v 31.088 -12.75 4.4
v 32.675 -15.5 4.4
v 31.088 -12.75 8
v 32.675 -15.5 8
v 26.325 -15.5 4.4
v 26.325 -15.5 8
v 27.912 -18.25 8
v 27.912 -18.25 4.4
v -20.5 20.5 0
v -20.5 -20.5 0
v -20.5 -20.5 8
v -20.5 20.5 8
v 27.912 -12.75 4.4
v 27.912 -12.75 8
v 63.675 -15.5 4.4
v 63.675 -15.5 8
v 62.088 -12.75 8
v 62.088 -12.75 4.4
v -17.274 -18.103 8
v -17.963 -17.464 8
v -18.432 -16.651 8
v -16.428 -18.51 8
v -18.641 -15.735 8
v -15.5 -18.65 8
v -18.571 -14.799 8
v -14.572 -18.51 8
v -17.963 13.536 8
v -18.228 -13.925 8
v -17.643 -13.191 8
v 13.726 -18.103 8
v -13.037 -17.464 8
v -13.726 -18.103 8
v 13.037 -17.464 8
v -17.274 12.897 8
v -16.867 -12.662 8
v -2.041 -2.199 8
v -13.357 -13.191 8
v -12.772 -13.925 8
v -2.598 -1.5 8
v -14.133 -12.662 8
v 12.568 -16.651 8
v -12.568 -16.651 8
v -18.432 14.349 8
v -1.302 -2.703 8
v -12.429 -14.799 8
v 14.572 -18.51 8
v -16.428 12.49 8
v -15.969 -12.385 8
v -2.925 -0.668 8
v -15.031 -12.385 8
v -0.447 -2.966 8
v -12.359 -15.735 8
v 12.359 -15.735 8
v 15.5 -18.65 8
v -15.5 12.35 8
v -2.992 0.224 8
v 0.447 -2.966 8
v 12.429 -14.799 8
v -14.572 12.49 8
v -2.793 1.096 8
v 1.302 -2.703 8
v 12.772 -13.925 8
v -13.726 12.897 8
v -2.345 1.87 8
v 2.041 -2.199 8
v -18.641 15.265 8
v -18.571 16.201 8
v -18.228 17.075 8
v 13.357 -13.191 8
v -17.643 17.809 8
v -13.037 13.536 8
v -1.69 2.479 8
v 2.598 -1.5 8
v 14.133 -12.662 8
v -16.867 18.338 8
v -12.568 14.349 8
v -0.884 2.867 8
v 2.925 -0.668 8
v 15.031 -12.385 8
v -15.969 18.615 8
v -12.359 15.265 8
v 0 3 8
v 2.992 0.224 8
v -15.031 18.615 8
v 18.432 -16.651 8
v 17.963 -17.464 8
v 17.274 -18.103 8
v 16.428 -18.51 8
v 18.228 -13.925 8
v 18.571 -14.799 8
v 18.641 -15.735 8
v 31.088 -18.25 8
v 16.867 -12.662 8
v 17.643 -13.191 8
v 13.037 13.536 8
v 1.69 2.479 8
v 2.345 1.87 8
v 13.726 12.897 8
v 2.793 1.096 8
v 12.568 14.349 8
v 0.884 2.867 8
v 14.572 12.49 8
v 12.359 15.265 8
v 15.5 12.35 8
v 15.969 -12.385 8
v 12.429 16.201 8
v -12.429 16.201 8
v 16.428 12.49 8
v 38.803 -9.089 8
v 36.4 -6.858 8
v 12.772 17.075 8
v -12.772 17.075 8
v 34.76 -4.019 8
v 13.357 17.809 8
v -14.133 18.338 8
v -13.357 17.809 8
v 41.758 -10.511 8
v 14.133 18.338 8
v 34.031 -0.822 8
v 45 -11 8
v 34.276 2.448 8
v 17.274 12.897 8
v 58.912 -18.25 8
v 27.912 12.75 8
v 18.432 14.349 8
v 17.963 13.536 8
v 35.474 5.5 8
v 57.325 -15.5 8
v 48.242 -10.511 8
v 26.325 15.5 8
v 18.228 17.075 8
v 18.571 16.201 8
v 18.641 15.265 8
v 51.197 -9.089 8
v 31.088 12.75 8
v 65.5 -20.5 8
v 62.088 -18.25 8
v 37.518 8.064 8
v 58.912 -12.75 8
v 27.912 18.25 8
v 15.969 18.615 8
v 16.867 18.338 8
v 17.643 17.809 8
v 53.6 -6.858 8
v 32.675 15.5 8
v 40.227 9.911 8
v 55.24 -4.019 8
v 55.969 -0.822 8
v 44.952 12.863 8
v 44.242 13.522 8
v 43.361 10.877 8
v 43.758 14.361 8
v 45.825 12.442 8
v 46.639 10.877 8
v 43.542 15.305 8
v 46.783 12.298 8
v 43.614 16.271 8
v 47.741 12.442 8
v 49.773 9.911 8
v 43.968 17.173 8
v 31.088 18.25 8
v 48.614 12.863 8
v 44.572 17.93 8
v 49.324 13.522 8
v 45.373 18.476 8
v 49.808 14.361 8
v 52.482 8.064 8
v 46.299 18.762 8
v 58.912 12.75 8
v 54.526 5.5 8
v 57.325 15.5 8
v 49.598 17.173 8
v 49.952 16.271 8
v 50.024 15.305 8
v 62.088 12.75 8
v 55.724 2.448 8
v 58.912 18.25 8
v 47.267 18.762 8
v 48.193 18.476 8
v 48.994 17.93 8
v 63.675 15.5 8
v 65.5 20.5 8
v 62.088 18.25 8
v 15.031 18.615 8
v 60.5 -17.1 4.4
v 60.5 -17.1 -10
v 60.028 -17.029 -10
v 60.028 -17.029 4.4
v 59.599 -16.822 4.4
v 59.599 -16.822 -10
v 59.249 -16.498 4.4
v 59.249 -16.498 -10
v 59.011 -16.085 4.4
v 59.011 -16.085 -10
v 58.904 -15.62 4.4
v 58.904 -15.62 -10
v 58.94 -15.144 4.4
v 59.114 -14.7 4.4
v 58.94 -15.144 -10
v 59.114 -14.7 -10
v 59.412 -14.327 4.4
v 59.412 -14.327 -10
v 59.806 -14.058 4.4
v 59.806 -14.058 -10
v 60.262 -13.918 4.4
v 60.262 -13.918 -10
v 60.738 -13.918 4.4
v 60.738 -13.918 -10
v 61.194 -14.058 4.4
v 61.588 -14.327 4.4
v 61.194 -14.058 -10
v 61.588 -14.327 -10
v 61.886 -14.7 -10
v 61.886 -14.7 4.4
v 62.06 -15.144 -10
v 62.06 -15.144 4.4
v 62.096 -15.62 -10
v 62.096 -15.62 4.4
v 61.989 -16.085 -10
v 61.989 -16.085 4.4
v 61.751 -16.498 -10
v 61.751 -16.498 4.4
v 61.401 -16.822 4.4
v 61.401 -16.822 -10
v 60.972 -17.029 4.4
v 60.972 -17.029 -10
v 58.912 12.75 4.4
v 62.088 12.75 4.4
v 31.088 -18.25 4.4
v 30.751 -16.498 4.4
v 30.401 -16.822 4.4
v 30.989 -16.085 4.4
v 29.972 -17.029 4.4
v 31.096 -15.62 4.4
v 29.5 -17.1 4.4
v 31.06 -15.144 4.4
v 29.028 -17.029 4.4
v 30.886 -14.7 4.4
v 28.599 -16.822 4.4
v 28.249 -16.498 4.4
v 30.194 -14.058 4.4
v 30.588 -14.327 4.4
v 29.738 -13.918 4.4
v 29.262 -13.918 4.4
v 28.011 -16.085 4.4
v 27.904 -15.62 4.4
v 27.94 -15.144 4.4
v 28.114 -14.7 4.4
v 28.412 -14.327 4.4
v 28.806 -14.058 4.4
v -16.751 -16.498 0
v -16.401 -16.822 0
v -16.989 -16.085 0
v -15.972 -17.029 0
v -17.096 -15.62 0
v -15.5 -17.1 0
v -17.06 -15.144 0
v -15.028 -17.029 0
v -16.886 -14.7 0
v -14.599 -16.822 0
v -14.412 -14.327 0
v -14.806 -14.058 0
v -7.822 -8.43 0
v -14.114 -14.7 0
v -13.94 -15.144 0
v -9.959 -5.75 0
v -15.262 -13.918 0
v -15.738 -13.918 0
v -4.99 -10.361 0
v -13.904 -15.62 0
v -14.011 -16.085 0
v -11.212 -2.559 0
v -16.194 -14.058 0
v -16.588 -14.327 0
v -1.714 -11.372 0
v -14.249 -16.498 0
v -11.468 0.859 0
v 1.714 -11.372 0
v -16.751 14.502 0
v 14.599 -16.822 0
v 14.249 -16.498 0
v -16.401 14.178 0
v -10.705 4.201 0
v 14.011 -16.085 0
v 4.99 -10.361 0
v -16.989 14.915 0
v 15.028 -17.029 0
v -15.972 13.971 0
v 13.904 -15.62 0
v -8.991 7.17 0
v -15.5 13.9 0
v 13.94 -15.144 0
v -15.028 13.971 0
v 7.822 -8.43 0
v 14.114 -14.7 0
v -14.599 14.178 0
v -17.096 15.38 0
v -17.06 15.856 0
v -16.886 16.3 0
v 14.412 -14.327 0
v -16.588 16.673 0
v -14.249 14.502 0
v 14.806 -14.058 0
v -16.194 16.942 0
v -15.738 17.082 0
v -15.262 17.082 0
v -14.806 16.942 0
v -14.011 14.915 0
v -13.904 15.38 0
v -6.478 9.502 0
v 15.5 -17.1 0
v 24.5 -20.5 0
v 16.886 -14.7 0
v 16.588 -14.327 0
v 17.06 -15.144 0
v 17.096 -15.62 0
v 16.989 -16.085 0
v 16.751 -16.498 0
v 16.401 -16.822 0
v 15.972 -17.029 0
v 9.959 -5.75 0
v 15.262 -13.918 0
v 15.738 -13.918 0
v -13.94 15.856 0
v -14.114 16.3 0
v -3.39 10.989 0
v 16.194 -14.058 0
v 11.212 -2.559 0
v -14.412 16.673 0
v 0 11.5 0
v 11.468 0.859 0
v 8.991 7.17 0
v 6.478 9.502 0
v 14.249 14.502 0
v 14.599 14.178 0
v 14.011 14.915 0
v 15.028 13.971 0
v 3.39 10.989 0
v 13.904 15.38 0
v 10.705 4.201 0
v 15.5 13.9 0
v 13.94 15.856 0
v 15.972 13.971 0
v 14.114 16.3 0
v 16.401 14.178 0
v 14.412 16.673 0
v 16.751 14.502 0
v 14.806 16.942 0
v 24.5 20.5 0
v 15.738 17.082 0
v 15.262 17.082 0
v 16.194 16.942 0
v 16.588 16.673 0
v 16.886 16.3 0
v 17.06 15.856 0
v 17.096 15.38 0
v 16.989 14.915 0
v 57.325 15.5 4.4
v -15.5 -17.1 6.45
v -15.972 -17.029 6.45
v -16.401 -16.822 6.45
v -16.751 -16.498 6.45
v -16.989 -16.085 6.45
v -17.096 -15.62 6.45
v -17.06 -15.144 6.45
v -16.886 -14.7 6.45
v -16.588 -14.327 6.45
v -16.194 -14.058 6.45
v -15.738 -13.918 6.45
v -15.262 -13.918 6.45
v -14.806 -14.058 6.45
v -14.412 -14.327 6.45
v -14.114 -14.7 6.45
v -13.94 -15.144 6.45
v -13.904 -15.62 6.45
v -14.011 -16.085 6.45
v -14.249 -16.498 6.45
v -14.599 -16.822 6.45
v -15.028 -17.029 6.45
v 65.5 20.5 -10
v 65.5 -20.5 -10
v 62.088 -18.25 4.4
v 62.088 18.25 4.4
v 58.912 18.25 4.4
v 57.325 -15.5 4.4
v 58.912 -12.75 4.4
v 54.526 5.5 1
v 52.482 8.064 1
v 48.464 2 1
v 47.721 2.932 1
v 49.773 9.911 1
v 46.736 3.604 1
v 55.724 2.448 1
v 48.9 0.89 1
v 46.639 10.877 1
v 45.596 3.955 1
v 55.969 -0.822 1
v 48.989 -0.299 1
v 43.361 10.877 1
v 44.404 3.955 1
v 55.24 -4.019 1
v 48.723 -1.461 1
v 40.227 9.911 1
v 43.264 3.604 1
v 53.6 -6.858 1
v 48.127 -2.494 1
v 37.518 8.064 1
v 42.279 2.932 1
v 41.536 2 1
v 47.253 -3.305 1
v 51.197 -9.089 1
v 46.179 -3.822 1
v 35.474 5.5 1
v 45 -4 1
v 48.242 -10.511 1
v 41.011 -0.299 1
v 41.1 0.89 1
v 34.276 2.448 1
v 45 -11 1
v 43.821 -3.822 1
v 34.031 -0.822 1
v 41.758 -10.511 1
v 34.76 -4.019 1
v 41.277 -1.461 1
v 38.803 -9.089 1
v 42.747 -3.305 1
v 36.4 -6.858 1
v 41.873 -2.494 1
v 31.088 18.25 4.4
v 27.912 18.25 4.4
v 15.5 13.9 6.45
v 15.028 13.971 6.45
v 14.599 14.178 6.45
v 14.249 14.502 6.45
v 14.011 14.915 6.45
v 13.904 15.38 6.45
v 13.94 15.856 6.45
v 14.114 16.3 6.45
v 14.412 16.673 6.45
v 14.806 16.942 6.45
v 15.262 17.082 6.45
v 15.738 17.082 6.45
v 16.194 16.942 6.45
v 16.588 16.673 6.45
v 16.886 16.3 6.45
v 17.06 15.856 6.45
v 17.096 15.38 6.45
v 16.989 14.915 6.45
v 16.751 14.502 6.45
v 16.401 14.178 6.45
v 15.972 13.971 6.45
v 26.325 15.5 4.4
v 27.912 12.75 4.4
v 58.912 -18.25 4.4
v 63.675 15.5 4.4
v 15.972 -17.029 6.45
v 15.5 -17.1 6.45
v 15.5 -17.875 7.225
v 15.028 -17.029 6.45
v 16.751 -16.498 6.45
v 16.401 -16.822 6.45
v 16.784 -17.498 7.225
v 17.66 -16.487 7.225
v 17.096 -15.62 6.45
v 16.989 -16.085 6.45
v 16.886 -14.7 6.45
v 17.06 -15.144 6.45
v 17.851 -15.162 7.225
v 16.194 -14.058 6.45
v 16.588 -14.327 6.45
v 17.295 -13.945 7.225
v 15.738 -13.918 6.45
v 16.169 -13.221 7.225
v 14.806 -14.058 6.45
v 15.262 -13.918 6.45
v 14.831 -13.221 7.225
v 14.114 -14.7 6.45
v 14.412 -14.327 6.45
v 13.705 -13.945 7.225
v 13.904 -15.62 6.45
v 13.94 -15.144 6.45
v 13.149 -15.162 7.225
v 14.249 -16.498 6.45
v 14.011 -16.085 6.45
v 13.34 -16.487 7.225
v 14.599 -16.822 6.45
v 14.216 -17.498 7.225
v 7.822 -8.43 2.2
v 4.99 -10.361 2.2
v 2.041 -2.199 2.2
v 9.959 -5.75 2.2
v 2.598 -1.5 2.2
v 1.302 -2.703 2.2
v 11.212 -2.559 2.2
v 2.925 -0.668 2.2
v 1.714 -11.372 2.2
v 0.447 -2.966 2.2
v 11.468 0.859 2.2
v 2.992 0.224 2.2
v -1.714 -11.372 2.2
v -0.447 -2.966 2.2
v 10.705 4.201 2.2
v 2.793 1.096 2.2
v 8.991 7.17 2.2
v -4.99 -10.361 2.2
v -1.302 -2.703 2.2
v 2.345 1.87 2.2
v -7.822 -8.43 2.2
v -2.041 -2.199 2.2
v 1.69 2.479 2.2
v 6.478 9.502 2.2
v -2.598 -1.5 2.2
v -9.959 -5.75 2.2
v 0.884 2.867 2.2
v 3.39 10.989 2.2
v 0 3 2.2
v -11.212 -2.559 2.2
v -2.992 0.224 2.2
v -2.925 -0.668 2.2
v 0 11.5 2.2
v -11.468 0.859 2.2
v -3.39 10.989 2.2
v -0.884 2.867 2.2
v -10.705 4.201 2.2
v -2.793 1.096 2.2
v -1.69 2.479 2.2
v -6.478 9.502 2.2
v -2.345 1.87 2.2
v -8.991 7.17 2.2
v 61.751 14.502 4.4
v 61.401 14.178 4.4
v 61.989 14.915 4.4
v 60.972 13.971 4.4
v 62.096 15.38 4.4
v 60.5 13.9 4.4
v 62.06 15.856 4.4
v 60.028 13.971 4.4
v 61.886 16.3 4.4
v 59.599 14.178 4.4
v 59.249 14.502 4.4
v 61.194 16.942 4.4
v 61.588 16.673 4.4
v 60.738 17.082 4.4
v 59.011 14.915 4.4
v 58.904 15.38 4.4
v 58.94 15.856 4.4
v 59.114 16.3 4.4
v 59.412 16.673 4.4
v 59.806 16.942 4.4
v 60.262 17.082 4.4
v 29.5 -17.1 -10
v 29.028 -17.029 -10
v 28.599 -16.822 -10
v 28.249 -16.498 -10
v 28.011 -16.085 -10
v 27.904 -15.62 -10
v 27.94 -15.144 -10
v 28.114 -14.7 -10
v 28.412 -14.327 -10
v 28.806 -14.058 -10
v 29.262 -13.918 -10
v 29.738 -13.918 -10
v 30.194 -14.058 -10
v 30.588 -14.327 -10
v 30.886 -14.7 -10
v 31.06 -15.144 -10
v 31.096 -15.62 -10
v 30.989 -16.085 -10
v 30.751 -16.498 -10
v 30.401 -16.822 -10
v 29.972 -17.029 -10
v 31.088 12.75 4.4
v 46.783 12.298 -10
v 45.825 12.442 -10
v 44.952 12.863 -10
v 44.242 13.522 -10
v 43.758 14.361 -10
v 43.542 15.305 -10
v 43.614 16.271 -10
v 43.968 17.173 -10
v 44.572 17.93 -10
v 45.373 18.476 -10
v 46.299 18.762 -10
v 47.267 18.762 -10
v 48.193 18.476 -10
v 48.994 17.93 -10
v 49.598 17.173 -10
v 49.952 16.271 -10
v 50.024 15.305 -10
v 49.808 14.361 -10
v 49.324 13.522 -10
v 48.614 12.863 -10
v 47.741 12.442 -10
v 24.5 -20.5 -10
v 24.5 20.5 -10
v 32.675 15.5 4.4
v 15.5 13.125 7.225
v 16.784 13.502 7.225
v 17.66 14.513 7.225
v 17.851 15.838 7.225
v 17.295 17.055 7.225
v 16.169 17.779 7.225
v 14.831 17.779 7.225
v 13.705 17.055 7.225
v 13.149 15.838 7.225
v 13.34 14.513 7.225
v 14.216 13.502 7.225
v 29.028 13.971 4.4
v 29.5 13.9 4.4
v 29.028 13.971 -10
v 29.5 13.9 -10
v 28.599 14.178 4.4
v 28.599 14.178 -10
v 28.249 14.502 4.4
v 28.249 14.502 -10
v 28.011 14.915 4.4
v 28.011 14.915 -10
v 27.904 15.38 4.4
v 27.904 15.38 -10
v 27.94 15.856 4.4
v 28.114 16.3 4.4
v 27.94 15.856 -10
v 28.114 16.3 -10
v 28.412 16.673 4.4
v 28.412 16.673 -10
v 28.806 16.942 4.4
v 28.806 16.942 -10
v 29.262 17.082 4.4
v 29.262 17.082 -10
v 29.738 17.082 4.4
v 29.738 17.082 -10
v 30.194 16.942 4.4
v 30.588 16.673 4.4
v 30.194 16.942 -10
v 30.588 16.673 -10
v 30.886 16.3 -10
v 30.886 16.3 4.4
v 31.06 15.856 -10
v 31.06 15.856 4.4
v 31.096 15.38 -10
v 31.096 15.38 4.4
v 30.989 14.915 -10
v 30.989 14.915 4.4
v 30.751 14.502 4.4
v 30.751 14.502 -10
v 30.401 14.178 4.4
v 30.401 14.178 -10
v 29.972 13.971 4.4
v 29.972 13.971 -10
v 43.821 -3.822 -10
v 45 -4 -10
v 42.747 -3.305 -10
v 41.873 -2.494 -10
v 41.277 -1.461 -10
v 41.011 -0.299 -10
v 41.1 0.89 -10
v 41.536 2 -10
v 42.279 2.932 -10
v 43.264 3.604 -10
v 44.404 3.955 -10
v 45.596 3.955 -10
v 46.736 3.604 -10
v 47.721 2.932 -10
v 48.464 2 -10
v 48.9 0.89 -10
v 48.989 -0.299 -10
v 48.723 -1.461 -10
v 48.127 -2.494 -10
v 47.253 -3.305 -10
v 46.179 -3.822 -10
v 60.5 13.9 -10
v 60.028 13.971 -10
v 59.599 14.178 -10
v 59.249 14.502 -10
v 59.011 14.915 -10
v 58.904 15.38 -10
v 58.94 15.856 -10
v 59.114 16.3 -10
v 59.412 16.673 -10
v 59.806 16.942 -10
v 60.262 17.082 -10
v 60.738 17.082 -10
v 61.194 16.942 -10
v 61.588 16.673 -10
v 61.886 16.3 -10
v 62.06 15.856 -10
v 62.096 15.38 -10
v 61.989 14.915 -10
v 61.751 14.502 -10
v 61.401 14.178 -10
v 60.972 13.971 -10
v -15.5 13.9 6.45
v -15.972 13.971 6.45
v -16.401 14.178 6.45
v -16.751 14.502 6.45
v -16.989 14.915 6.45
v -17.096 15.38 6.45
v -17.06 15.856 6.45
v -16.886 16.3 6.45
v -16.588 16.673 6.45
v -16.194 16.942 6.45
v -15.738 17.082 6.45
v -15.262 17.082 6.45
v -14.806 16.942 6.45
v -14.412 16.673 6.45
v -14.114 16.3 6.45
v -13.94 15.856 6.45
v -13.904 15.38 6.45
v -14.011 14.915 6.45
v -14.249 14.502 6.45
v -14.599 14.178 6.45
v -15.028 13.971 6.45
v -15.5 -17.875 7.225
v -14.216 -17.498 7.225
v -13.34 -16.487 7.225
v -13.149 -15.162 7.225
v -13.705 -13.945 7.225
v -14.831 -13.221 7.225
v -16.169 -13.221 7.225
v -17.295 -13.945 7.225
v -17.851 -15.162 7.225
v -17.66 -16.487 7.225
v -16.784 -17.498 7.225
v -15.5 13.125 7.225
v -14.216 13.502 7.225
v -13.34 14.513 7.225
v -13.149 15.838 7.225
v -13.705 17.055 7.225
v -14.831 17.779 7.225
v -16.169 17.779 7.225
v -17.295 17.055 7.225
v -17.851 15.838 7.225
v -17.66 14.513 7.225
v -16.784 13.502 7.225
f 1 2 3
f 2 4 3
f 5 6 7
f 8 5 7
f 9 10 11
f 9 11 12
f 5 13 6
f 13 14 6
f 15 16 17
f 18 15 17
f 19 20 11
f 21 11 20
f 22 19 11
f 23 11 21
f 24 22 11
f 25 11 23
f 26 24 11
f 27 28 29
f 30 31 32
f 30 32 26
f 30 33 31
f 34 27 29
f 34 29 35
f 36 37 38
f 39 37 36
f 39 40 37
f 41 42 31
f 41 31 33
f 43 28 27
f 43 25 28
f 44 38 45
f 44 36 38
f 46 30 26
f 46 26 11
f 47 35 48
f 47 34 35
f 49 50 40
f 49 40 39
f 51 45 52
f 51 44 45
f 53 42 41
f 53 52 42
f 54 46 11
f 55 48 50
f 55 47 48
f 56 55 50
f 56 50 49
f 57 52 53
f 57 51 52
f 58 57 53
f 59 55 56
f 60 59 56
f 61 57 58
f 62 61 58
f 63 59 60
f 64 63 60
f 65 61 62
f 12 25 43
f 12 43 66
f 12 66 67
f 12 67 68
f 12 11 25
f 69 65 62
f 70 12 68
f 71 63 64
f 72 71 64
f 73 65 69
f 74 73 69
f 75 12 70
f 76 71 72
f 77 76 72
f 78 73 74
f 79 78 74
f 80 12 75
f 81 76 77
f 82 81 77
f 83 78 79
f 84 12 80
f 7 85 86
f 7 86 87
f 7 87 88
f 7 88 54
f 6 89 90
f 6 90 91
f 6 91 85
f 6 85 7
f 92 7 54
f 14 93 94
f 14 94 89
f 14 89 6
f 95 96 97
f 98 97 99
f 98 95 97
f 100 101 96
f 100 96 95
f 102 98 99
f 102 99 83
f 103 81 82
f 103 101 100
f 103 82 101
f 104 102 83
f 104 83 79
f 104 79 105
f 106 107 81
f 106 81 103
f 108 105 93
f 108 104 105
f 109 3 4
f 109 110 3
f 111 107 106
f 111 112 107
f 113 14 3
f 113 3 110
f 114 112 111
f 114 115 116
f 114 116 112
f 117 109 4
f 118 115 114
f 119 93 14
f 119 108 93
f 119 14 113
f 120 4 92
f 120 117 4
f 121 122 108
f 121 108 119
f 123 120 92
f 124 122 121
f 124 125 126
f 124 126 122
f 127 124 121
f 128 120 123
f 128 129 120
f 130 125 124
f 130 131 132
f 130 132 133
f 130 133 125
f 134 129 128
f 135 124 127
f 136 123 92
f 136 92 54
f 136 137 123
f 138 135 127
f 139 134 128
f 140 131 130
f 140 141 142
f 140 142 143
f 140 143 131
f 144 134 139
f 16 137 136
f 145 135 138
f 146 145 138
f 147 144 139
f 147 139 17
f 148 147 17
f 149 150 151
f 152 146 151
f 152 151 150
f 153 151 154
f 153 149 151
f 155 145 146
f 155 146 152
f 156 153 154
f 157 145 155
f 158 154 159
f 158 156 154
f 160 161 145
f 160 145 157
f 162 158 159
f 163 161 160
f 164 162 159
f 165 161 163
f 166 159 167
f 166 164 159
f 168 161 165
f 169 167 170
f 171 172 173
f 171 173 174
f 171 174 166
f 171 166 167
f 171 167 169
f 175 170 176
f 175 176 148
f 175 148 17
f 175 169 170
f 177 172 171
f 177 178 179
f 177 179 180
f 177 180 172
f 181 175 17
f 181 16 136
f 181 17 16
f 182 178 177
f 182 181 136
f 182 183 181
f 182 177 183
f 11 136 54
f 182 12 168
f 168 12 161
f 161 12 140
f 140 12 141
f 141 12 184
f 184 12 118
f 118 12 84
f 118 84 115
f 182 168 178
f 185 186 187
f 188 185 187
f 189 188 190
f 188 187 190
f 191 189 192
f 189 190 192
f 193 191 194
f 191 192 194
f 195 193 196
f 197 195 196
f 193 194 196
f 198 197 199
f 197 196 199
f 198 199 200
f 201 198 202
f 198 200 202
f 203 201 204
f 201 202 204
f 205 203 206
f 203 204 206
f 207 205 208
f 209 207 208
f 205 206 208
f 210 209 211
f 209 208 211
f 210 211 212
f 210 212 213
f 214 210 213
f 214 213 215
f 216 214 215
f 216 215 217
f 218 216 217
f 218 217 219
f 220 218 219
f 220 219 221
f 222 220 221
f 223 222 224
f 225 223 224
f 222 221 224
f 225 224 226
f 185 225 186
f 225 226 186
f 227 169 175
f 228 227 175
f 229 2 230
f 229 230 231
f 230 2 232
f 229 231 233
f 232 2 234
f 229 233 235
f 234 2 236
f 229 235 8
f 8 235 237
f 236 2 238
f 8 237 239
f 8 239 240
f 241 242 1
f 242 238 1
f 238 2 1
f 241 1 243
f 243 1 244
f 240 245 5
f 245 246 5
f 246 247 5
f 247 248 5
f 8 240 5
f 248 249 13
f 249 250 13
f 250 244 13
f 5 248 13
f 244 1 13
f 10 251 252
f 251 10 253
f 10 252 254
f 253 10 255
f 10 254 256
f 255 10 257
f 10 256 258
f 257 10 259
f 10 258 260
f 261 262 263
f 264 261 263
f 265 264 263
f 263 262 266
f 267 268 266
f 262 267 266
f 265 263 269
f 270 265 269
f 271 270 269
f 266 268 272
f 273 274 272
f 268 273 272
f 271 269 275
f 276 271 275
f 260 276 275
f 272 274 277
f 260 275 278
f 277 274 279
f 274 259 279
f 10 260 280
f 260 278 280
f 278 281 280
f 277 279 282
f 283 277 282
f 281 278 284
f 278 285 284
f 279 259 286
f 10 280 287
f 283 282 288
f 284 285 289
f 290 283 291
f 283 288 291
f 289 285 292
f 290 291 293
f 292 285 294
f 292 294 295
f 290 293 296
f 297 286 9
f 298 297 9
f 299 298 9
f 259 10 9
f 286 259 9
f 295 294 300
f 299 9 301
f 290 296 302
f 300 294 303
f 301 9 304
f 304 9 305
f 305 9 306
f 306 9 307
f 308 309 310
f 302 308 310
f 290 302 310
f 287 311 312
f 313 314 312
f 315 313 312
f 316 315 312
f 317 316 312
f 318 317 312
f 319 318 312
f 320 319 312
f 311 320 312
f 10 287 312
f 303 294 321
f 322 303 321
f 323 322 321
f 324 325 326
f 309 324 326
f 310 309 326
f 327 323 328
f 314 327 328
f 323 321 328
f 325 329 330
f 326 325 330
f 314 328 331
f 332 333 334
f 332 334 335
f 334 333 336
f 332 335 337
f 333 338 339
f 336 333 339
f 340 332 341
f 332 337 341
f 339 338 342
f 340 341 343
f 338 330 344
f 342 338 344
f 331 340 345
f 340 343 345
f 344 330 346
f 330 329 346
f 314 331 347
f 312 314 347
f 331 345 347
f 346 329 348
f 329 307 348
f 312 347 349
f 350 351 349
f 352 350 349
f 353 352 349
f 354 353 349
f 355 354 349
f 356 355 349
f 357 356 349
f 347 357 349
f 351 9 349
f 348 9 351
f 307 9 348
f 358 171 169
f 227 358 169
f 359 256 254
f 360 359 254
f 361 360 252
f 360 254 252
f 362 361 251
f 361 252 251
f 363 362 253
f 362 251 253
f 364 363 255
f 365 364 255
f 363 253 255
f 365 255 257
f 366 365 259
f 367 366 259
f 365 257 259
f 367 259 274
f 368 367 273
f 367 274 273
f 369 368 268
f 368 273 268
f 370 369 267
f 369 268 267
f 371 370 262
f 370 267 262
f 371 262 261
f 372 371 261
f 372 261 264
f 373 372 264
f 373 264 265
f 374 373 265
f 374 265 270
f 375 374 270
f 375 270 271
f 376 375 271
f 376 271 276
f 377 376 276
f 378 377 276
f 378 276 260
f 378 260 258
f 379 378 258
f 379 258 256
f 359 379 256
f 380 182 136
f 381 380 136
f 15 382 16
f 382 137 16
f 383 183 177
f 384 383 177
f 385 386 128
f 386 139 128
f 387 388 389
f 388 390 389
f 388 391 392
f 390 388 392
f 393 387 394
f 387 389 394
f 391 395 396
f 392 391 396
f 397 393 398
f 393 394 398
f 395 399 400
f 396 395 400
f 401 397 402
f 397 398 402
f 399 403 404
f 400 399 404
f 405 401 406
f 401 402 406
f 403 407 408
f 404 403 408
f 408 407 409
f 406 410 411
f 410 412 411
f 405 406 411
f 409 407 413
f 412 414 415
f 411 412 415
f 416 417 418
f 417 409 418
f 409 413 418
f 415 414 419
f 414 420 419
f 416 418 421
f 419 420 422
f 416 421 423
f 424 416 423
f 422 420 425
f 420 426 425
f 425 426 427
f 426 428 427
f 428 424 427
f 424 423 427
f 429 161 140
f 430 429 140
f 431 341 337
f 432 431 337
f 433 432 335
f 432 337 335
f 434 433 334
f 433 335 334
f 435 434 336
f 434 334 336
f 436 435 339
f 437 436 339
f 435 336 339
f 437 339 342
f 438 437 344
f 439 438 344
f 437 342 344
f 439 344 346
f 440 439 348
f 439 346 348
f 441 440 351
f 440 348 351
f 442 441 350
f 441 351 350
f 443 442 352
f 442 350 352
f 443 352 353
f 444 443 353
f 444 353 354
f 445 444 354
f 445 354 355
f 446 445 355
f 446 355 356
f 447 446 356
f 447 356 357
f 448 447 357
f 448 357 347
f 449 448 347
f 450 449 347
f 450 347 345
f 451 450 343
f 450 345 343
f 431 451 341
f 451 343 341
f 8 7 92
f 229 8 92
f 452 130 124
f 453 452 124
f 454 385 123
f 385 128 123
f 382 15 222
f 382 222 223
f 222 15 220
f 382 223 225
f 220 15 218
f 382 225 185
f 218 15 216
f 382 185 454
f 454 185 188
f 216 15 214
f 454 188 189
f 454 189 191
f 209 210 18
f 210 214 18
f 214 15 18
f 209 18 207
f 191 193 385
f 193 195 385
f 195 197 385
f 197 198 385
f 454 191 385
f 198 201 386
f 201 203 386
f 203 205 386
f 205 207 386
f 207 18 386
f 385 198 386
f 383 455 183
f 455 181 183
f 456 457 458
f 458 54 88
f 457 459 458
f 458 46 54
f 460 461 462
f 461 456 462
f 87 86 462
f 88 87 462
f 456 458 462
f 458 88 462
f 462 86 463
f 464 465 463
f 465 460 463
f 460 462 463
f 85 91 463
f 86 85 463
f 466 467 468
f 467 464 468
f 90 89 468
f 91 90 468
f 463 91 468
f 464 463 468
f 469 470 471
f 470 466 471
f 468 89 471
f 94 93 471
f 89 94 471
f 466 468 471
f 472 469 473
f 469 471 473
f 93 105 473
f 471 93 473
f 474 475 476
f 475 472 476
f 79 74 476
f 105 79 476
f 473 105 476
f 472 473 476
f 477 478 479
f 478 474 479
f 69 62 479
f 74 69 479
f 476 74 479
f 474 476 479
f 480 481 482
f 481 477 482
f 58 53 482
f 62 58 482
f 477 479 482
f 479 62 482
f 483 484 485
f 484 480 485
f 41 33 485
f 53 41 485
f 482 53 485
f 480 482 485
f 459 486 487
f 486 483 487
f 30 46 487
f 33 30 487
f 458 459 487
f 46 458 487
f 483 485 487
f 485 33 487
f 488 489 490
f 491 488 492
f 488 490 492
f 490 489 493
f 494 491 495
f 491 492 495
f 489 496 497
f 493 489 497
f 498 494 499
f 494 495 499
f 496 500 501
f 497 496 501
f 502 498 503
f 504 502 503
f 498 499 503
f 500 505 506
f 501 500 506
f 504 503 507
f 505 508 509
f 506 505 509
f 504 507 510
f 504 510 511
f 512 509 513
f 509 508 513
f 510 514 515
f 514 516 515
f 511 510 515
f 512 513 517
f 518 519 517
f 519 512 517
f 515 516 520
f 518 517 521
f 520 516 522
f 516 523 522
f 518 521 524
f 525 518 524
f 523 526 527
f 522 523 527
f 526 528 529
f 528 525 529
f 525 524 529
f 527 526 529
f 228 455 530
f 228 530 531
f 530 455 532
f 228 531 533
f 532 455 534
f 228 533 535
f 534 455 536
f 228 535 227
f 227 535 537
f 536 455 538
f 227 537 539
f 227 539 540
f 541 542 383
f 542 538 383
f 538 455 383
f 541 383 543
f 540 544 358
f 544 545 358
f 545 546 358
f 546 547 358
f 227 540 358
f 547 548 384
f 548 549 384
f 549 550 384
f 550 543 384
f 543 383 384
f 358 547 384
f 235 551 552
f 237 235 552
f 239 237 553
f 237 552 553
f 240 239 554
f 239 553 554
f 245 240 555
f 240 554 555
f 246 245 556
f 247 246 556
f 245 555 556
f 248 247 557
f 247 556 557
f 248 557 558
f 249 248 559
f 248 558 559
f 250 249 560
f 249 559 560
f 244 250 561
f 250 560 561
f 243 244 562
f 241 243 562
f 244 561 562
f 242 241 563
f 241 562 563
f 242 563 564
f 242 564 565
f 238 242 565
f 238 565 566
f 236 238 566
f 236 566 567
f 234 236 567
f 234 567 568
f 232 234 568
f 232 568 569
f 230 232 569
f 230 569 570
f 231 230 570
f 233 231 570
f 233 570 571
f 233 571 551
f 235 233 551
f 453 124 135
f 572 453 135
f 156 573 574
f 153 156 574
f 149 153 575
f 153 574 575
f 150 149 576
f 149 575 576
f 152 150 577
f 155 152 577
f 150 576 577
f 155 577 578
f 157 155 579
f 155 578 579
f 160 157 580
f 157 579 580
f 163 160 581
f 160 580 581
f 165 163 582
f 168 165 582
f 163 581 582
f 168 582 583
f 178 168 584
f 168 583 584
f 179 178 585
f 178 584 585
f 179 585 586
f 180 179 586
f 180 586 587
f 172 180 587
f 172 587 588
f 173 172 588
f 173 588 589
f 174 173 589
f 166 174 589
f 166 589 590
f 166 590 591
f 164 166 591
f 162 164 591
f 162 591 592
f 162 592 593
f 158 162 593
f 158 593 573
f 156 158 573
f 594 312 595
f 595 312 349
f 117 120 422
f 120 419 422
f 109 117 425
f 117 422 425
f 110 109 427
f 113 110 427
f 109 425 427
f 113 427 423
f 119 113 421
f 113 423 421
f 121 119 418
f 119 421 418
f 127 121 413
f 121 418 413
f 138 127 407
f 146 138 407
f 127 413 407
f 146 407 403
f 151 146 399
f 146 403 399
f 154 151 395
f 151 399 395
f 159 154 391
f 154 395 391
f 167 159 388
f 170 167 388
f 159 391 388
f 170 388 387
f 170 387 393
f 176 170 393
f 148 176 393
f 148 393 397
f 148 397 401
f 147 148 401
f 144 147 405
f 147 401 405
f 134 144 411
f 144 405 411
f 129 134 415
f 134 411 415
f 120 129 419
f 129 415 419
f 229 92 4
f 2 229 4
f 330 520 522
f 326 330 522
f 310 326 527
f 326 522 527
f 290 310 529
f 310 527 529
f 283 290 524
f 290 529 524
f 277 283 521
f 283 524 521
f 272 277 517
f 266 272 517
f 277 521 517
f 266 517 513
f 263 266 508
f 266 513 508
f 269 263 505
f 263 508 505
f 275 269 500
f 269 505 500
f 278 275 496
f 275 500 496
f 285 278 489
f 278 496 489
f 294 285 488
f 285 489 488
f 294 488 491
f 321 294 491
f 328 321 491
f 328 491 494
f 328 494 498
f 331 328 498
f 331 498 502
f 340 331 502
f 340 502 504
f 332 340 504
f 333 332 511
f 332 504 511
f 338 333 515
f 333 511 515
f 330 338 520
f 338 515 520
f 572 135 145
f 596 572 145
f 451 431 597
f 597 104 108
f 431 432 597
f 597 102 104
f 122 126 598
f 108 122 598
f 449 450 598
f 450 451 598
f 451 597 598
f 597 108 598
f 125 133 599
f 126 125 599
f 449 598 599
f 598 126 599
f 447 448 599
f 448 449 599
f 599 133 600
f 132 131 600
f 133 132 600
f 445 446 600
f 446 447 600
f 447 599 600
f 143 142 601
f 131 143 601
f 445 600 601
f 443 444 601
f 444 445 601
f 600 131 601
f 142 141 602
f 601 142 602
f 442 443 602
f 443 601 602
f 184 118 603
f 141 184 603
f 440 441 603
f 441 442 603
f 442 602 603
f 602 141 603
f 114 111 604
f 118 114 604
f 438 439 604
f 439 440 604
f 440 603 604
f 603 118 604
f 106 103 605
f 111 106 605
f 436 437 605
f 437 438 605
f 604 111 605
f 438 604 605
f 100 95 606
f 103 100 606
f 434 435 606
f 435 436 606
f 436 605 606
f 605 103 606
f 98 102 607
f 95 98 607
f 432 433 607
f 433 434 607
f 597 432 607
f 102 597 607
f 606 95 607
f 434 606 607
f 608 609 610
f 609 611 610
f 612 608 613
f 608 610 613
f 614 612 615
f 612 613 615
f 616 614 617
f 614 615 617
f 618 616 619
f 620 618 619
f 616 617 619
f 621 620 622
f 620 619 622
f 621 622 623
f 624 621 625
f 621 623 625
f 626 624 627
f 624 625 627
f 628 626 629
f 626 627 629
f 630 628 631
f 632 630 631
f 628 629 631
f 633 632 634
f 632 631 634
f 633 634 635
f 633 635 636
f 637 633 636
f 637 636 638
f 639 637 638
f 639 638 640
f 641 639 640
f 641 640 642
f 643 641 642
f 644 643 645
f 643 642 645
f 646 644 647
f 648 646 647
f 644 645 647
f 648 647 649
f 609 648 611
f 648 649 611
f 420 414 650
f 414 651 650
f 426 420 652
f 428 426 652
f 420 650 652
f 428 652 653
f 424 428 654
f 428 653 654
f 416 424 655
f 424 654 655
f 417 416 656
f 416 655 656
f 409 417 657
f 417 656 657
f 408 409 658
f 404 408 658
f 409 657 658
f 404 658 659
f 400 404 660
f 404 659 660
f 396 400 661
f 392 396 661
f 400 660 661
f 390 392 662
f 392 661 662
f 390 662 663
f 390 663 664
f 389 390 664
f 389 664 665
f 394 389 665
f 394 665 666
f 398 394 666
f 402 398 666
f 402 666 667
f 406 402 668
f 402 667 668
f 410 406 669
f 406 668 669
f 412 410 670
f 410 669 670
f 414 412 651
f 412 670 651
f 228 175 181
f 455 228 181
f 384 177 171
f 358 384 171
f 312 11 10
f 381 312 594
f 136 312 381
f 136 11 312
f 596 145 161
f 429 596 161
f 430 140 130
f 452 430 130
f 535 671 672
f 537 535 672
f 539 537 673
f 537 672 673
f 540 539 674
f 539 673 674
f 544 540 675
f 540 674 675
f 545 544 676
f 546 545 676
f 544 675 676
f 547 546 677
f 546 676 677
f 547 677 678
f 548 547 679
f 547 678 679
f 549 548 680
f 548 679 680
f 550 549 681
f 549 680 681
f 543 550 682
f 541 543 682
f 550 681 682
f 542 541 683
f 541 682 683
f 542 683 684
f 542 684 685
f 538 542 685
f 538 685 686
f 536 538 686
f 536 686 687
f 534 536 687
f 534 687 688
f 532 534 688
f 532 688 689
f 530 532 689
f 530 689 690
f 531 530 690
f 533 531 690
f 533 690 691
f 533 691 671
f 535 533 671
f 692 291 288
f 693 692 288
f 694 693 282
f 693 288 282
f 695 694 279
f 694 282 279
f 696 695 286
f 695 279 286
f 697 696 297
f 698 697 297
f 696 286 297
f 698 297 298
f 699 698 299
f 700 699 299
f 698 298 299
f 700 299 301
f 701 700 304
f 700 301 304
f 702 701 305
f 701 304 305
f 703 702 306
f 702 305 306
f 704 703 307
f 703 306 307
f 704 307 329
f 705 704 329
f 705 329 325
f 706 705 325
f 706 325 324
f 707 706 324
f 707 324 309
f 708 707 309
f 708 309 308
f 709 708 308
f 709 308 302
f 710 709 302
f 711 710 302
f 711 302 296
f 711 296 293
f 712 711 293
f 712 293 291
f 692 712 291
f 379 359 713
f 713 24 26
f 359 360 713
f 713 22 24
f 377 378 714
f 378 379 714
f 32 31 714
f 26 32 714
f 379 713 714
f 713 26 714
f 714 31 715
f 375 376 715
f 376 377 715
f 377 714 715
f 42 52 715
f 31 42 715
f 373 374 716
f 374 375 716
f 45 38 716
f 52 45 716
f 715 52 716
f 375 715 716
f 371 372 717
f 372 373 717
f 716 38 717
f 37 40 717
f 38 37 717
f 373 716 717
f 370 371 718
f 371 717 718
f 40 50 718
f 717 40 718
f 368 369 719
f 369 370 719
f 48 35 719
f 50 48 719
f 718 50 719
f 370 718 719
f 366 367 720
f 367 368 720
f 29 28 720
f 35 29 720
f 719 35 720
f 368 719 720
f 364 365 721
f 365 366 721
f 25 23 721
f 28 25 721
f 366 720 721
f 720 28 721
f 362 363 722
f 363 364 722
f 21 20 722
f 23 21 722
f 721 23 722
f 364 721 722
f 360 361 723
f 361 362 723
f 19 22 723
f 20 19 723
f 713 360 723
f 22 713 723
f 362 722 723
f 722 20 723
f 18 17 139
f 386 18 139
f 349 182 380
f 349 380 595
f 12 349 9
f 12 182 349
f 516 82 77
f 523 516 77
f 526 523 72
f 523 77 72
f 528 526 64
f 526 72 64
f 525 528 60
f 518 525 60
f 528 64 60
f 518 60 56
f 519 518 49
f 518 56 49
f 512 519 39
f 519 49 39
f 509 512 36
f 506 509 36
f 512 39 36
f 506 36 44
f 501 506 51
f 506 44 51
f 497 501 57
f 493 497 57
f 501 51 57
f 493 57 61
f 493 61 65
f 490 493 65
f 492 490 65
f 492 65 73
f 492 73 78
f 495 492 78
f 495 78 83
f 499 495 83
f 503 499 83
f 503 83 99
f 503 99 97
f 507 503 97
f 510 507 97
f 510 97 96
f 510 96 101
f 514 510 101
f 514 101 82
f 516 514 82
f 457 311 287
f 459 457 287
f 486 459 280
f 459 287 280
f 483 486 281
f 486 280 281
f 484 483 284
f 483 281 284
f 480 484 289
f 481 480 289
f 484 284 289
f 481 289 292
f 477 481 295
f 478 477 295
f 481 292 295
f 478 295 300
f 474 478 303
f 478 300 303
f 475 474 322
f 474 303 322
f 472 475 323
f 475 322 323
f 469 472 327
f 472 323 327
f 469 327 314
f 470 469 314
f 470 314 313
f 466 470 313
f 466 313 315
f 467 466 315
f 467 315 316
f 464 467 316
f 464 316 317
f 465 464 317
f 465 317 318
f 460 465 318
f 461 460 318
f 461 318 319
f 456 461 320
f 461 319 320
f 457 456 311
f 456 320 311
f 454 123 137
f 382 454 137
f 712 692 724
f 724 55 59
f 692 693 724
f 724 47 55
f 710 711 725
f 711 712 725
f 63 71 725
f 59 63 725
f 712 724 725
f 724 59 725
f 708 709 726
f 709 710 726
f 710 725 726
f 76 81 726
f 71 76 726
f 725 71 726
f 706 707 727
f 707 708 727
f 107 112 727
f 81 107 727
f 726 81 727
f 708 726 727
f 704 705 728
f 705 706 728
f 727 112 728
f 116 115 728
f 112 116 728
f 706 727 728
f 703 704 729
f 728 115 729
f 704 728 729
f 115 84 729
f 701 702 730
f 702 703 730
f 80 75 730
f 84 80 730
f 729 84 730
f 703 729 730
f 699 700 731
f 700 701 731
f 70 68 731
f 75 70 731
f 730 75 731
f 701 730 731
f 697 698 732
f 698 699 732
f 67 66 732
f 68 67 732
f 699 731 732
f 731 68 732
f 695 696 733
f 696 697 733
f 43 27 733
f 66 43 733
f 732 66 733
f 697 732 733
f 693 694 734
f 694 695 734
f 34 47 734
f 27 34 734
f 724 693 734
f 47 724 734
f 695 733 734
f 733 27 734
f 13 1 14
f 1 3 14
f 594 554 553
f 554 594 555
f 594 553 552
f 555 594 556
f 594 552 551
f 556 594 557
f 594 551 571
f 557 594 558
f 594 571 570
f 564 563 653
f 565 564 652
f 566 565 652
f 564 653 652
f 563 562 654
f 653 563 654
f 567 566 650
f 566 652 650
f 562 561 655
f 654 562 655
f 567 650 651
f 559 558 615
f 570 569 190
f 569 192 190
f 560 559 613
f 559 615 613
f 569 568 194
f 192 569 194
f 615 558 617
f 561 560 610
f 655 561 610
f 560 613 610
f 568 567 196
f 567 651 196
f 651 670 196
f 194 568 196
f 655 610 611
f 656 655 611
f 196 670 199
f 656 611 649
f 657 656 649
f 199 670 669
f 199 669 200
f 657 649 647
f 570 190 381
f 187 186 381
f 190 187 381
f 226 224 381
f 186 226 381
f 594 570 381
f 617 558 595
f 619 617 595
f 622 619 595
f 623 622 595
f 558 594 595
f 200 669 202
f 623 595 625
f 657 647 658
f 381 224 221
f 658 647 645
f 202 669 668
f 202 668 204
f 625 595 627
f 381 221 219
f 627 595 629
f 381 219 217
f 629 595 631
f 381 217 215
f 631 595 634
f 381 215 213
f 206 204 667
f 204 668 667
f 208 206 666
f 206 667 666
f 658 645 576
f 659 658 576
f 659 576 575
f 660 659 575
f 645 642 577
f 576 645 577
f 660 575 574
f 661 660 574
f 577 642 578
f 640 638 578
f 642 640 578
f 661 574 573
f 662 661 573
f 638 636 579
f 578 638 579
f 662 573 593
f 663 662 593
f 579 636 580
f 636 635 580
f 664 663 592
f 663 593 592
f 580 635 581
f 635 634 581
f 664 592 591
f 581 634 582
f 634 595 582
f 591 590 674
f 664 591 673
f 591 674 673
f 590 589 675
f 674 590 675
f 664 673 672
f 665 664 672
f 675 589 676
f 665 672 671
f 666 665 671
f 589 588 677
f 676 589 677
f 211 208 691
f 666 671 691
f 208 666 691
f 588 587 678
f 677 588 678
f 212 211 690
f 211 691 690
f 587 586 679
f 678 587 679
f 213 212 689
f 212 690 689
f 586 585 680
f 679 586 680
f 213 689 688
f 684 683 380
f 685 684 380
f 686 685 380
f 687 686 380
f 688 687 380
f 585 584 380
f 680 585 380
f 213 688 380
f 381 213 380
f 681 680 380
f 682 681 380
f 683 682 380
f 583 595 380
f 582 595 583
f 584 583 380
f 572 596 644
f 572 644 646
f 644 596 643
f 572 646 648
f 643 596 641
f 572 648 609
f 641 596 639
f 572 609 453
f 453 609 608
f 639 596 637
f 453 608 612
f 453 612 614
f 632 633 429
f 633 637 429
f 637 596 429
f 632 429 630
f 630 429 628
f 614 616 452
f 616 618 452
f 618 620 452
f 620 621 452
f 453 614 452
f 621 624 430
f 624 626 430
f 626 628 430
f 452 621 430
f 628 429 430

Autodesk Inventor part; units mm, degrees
ref_plane "YZ Plane" through (0, 0, 0) normal (1, 0, 0) x (0, 1, 0)
ref_plane "XZ Plane" through (0, 0, 0) normal (0, 1, 0) x (-1, 0, 0)
ref_plane "XY Plane" through (0, 0, 0) normal (0, 0, 1) x (1, 0, 0)
sketch "Sketch1" plane through (0, 0, 0) normal (0, 0, 1) x (1, 0, 0)
  line L0 (-15.5, 15.5) -> (15.5, 15.5)
  line L1 (15.5, 15.5) -> (15.5, -15.5)
  line L2 (15.5, -15.5) -> (-15.5, -15.5)
  line L3 (-15.5, -15.5) -> (-15.5, 15.5)
  line L4 (29.5, 15.5) -> (60.5, 15.5)
  line L5 (60.5, 15.5) -> (60.5, -15.5)
  line L6 (60.5, -15.5) -> (29.5, -15.5)
  line L7 (29.5, -15.5) -> (29.5, 15.5)
  line L8 (-20.5, 20.5) -> (65.5, 20.5)
  line L9 (65.5, 20.5) -> (65.5, -20.5)
  line L10 (65.5, -20.5) -> (-20.5, -20.5)
  line L11 (-20.5, -20.5) -> (-20.5, 20.5)
  circle A0 centre (0, 0) radius 11
  circle A1 centre (45, 0) radius 11
  dimension "d0" = 31
  dimension "d5" = 45
  dimension "d10" = 5
  dimension "d11" = 5
  dimension "d12" = 5
  dimension "d13" = 5
  dimension "d16" = 22
extrude "Extrusion1" add sketch "Sketch1" along normal blind 8 contours L0 L1 L2 L3 | L4 L5 L6 L7 | L8 L9 L10 L11 | A0 | A1
sketch "Sketch2" plane through (0, 0, 0) normal (0, 0, 1) x (1, 0, 0)
  circle A0 centre (45, 0) radius 11 projected
  point P0 (0, 0)
sketch "Sketch4" plane through (0, 0, 8) normal (0, 0, 1) x (1, 0, 0)
  point P0 (0, 0)
  point P1 (15.5, 15.5)
  point P2 (-15.5, 15.5)
  point P3 (-15.5, -15.5)
  point P4 (15.5, -15.5)
hole "Hole3" at (-15.5, 15.5, 8) at (15.5, 15.5, 8) at (15.5, -15.5, 8) at (-15.5, -15.5, 8) direction (0, 0, -1) diameter 3.2 end through all countersink diameter 6.3 countersink angle 90 clearance for "Flat Head Machine Screw" size "M3" standard "Ansi Metric M Profile"
sketch "Sketch16" plane through (0, 0, 0) normal (0, 0, 1) x (1, 0, 0)
  line L0 (65.5, 20.5) -> (-20.5, 20.5) projected
  line L1 (-20.5, -20.5) -> (65.5, -20.5) projected
  line L2 (24.5, 20.5) -> (65.5, 20.5)
  line L3 (65.5, 20.5) -> (65.5, -20.5)
  line L4 (65.5, -20.5) -> (24.5, -20.5)
  line L5 (24.5, -20.5) -> (24.5, 20.5)
  point P0 (0, 0)
extrude "Extrusion7" add sketch "Sketch16" against normal blind 10
sketch "Sketch18" plane through (0, 0, 8) normal (0, 0, 1) x (1, 0, 0)
  line L0 (29.5, 15.5) -> (60.5, 15.5) projected
  line L1 (29.5, -15.5) -> (29.5, 15.5) projected
  line L2 (60.5, -15.5) -> (29.5, -15.5) projected
  line L3 (60.5, 15.5) -> (60.5, -15.5) projected
  point P0 (0, 0)
sketch "Sketch14" plane through (0, 0, 8) normal (0, 0, -1) x (-1, 0, 0)
  circle A0 centre (-45, 0) radius 11 projected
  point P0 (0, 0)
  point P1 (-46.783, 15.548)
  dimension "d178" = 1.783
  dimension "d179" = 15.548
hole "Hole5" at (46.783, 15.548, 8) direction (0, 0, -1) diameter 6.5 end through all
sketch "Sketch13" plane through (0, 0, 8) normal (0, 0, -1) x (-1, 0, 0)
  line L0 (-62.0877, 18.25) -> (-58.9123, 18.25)
  line L1 (-58.9123, 18.25) -> (-57.3246, 15.5)
  line L2 (-57.3246, 15.5) -> (-58.9123, 12.75)
  line L3 (-58.9123, 12.75) -> (-62.0877, 12.75)
  line L4 (-62.0877, 12.75) -> (-63.6754, 15.5)
  line L5 (-63.6754, 15.5) -> (-62.0877, 18.25)
  line L6 (-31.0877, 18.25) -> (-27.9123, 18.25)
  line L7 (-27.9123, 18.25) -> (-26.3246, 15.5)
  line L8 (-26.3246, 15.5) -> (-27.9123, 12.75)
  line L9 (-27.9123, 12.75) -> (-31.0877, 12.75)
  line L10 (-31.0877, 12.75) -> (-32.6754, 15.5)
  line L11 (-32.6754, 15.5) -> (-31.0877, 18.25)
  line L12 (-62.0877, -12.75) -> (-58.9123, -12.75)
  line L13 (-58.9123, -12.75) -> (-57.3246, -15.5)
  line L14 (-57.3246, -15.5) -> (-58.9123, -18.25)
  line L15 (-58.9123, -18.25) -> (-62.0877, -18.25)
  line L16 (-62.0877, -18.25) -> (-63.6754, -15.5)
  line L17 (-63.6754, -15.5) -> (-62.0877, -12.75)
  line L18 (-31.0877, -12.75) -> (-27.9123, -12.75)
  line L19 (-27.9123, -12.75) -> (-26.3246, -15.5)
  line L20 (-26.3246, -15.5) -> (-27.9123, -18.25)
  line L21 (-27.9123, -18.25) -> (-31.0877, -18.25)
  line L22 (-31.0877, -18.25) -> (-32.6754, -15.5)
  line L23 (-32.6754, -15.5) -> (-31.0877, -12.75)
  point P0 (0, 0)
  point P1 (-60.5, 15.5)
  point P2 (-29.5, 15.5)
  point P3 (-60.5, -15.5)
  point P4 (-29.5, -15.5)
  point P5 (-60.5, 15.5)
  point P6 (-29.5, 15.5)
  point P7 (-60.5, -15.5)
  point P8 (-29.5, -15.5)
  point P9 (-45, 0)
  dimension "d129" = 5.5
extrude "Extrusion6" cut sketch "Sketch13" along normal blind 3.6
hole "Hole7" at (45, 0, 8) direction (0, 0, -1) diameter 8 end through all counterbore diameter 22 counterbore depth 7
hole "Hole8" at (29.5, 15.5, 8) at (60.5, 15.5, 8) at (60.5, -15.5, 8) at (29.5, -15.5, 8) direction (0, 0, -1) diameter 3.2 end through all clearance for "Flat Head Machine Screw" size "M3" standard "Ansi Metric M Profile"
hole "Hole9" at (0, 0, 0) direction (0, 0, 1) diameter 6 end through all counterbore diameter 23 counterbore depth 2.2
equation "\"d64\" = 55deg"
equation "\"Sketch5_Pitch\" = 0.5"
equation "\"d82\" = 55deg"
equation "\"Sketch7_Pitch\" = 0.5"
equation "\"d100\" = 55deg"
equation "\"Sketch9_Pitch\" = 0.5"
equation "\"d118\" = 55deg"
equation "\"Sketch11_Pitch\" = 0.5"
properties part number "ReductionGearBracket"
